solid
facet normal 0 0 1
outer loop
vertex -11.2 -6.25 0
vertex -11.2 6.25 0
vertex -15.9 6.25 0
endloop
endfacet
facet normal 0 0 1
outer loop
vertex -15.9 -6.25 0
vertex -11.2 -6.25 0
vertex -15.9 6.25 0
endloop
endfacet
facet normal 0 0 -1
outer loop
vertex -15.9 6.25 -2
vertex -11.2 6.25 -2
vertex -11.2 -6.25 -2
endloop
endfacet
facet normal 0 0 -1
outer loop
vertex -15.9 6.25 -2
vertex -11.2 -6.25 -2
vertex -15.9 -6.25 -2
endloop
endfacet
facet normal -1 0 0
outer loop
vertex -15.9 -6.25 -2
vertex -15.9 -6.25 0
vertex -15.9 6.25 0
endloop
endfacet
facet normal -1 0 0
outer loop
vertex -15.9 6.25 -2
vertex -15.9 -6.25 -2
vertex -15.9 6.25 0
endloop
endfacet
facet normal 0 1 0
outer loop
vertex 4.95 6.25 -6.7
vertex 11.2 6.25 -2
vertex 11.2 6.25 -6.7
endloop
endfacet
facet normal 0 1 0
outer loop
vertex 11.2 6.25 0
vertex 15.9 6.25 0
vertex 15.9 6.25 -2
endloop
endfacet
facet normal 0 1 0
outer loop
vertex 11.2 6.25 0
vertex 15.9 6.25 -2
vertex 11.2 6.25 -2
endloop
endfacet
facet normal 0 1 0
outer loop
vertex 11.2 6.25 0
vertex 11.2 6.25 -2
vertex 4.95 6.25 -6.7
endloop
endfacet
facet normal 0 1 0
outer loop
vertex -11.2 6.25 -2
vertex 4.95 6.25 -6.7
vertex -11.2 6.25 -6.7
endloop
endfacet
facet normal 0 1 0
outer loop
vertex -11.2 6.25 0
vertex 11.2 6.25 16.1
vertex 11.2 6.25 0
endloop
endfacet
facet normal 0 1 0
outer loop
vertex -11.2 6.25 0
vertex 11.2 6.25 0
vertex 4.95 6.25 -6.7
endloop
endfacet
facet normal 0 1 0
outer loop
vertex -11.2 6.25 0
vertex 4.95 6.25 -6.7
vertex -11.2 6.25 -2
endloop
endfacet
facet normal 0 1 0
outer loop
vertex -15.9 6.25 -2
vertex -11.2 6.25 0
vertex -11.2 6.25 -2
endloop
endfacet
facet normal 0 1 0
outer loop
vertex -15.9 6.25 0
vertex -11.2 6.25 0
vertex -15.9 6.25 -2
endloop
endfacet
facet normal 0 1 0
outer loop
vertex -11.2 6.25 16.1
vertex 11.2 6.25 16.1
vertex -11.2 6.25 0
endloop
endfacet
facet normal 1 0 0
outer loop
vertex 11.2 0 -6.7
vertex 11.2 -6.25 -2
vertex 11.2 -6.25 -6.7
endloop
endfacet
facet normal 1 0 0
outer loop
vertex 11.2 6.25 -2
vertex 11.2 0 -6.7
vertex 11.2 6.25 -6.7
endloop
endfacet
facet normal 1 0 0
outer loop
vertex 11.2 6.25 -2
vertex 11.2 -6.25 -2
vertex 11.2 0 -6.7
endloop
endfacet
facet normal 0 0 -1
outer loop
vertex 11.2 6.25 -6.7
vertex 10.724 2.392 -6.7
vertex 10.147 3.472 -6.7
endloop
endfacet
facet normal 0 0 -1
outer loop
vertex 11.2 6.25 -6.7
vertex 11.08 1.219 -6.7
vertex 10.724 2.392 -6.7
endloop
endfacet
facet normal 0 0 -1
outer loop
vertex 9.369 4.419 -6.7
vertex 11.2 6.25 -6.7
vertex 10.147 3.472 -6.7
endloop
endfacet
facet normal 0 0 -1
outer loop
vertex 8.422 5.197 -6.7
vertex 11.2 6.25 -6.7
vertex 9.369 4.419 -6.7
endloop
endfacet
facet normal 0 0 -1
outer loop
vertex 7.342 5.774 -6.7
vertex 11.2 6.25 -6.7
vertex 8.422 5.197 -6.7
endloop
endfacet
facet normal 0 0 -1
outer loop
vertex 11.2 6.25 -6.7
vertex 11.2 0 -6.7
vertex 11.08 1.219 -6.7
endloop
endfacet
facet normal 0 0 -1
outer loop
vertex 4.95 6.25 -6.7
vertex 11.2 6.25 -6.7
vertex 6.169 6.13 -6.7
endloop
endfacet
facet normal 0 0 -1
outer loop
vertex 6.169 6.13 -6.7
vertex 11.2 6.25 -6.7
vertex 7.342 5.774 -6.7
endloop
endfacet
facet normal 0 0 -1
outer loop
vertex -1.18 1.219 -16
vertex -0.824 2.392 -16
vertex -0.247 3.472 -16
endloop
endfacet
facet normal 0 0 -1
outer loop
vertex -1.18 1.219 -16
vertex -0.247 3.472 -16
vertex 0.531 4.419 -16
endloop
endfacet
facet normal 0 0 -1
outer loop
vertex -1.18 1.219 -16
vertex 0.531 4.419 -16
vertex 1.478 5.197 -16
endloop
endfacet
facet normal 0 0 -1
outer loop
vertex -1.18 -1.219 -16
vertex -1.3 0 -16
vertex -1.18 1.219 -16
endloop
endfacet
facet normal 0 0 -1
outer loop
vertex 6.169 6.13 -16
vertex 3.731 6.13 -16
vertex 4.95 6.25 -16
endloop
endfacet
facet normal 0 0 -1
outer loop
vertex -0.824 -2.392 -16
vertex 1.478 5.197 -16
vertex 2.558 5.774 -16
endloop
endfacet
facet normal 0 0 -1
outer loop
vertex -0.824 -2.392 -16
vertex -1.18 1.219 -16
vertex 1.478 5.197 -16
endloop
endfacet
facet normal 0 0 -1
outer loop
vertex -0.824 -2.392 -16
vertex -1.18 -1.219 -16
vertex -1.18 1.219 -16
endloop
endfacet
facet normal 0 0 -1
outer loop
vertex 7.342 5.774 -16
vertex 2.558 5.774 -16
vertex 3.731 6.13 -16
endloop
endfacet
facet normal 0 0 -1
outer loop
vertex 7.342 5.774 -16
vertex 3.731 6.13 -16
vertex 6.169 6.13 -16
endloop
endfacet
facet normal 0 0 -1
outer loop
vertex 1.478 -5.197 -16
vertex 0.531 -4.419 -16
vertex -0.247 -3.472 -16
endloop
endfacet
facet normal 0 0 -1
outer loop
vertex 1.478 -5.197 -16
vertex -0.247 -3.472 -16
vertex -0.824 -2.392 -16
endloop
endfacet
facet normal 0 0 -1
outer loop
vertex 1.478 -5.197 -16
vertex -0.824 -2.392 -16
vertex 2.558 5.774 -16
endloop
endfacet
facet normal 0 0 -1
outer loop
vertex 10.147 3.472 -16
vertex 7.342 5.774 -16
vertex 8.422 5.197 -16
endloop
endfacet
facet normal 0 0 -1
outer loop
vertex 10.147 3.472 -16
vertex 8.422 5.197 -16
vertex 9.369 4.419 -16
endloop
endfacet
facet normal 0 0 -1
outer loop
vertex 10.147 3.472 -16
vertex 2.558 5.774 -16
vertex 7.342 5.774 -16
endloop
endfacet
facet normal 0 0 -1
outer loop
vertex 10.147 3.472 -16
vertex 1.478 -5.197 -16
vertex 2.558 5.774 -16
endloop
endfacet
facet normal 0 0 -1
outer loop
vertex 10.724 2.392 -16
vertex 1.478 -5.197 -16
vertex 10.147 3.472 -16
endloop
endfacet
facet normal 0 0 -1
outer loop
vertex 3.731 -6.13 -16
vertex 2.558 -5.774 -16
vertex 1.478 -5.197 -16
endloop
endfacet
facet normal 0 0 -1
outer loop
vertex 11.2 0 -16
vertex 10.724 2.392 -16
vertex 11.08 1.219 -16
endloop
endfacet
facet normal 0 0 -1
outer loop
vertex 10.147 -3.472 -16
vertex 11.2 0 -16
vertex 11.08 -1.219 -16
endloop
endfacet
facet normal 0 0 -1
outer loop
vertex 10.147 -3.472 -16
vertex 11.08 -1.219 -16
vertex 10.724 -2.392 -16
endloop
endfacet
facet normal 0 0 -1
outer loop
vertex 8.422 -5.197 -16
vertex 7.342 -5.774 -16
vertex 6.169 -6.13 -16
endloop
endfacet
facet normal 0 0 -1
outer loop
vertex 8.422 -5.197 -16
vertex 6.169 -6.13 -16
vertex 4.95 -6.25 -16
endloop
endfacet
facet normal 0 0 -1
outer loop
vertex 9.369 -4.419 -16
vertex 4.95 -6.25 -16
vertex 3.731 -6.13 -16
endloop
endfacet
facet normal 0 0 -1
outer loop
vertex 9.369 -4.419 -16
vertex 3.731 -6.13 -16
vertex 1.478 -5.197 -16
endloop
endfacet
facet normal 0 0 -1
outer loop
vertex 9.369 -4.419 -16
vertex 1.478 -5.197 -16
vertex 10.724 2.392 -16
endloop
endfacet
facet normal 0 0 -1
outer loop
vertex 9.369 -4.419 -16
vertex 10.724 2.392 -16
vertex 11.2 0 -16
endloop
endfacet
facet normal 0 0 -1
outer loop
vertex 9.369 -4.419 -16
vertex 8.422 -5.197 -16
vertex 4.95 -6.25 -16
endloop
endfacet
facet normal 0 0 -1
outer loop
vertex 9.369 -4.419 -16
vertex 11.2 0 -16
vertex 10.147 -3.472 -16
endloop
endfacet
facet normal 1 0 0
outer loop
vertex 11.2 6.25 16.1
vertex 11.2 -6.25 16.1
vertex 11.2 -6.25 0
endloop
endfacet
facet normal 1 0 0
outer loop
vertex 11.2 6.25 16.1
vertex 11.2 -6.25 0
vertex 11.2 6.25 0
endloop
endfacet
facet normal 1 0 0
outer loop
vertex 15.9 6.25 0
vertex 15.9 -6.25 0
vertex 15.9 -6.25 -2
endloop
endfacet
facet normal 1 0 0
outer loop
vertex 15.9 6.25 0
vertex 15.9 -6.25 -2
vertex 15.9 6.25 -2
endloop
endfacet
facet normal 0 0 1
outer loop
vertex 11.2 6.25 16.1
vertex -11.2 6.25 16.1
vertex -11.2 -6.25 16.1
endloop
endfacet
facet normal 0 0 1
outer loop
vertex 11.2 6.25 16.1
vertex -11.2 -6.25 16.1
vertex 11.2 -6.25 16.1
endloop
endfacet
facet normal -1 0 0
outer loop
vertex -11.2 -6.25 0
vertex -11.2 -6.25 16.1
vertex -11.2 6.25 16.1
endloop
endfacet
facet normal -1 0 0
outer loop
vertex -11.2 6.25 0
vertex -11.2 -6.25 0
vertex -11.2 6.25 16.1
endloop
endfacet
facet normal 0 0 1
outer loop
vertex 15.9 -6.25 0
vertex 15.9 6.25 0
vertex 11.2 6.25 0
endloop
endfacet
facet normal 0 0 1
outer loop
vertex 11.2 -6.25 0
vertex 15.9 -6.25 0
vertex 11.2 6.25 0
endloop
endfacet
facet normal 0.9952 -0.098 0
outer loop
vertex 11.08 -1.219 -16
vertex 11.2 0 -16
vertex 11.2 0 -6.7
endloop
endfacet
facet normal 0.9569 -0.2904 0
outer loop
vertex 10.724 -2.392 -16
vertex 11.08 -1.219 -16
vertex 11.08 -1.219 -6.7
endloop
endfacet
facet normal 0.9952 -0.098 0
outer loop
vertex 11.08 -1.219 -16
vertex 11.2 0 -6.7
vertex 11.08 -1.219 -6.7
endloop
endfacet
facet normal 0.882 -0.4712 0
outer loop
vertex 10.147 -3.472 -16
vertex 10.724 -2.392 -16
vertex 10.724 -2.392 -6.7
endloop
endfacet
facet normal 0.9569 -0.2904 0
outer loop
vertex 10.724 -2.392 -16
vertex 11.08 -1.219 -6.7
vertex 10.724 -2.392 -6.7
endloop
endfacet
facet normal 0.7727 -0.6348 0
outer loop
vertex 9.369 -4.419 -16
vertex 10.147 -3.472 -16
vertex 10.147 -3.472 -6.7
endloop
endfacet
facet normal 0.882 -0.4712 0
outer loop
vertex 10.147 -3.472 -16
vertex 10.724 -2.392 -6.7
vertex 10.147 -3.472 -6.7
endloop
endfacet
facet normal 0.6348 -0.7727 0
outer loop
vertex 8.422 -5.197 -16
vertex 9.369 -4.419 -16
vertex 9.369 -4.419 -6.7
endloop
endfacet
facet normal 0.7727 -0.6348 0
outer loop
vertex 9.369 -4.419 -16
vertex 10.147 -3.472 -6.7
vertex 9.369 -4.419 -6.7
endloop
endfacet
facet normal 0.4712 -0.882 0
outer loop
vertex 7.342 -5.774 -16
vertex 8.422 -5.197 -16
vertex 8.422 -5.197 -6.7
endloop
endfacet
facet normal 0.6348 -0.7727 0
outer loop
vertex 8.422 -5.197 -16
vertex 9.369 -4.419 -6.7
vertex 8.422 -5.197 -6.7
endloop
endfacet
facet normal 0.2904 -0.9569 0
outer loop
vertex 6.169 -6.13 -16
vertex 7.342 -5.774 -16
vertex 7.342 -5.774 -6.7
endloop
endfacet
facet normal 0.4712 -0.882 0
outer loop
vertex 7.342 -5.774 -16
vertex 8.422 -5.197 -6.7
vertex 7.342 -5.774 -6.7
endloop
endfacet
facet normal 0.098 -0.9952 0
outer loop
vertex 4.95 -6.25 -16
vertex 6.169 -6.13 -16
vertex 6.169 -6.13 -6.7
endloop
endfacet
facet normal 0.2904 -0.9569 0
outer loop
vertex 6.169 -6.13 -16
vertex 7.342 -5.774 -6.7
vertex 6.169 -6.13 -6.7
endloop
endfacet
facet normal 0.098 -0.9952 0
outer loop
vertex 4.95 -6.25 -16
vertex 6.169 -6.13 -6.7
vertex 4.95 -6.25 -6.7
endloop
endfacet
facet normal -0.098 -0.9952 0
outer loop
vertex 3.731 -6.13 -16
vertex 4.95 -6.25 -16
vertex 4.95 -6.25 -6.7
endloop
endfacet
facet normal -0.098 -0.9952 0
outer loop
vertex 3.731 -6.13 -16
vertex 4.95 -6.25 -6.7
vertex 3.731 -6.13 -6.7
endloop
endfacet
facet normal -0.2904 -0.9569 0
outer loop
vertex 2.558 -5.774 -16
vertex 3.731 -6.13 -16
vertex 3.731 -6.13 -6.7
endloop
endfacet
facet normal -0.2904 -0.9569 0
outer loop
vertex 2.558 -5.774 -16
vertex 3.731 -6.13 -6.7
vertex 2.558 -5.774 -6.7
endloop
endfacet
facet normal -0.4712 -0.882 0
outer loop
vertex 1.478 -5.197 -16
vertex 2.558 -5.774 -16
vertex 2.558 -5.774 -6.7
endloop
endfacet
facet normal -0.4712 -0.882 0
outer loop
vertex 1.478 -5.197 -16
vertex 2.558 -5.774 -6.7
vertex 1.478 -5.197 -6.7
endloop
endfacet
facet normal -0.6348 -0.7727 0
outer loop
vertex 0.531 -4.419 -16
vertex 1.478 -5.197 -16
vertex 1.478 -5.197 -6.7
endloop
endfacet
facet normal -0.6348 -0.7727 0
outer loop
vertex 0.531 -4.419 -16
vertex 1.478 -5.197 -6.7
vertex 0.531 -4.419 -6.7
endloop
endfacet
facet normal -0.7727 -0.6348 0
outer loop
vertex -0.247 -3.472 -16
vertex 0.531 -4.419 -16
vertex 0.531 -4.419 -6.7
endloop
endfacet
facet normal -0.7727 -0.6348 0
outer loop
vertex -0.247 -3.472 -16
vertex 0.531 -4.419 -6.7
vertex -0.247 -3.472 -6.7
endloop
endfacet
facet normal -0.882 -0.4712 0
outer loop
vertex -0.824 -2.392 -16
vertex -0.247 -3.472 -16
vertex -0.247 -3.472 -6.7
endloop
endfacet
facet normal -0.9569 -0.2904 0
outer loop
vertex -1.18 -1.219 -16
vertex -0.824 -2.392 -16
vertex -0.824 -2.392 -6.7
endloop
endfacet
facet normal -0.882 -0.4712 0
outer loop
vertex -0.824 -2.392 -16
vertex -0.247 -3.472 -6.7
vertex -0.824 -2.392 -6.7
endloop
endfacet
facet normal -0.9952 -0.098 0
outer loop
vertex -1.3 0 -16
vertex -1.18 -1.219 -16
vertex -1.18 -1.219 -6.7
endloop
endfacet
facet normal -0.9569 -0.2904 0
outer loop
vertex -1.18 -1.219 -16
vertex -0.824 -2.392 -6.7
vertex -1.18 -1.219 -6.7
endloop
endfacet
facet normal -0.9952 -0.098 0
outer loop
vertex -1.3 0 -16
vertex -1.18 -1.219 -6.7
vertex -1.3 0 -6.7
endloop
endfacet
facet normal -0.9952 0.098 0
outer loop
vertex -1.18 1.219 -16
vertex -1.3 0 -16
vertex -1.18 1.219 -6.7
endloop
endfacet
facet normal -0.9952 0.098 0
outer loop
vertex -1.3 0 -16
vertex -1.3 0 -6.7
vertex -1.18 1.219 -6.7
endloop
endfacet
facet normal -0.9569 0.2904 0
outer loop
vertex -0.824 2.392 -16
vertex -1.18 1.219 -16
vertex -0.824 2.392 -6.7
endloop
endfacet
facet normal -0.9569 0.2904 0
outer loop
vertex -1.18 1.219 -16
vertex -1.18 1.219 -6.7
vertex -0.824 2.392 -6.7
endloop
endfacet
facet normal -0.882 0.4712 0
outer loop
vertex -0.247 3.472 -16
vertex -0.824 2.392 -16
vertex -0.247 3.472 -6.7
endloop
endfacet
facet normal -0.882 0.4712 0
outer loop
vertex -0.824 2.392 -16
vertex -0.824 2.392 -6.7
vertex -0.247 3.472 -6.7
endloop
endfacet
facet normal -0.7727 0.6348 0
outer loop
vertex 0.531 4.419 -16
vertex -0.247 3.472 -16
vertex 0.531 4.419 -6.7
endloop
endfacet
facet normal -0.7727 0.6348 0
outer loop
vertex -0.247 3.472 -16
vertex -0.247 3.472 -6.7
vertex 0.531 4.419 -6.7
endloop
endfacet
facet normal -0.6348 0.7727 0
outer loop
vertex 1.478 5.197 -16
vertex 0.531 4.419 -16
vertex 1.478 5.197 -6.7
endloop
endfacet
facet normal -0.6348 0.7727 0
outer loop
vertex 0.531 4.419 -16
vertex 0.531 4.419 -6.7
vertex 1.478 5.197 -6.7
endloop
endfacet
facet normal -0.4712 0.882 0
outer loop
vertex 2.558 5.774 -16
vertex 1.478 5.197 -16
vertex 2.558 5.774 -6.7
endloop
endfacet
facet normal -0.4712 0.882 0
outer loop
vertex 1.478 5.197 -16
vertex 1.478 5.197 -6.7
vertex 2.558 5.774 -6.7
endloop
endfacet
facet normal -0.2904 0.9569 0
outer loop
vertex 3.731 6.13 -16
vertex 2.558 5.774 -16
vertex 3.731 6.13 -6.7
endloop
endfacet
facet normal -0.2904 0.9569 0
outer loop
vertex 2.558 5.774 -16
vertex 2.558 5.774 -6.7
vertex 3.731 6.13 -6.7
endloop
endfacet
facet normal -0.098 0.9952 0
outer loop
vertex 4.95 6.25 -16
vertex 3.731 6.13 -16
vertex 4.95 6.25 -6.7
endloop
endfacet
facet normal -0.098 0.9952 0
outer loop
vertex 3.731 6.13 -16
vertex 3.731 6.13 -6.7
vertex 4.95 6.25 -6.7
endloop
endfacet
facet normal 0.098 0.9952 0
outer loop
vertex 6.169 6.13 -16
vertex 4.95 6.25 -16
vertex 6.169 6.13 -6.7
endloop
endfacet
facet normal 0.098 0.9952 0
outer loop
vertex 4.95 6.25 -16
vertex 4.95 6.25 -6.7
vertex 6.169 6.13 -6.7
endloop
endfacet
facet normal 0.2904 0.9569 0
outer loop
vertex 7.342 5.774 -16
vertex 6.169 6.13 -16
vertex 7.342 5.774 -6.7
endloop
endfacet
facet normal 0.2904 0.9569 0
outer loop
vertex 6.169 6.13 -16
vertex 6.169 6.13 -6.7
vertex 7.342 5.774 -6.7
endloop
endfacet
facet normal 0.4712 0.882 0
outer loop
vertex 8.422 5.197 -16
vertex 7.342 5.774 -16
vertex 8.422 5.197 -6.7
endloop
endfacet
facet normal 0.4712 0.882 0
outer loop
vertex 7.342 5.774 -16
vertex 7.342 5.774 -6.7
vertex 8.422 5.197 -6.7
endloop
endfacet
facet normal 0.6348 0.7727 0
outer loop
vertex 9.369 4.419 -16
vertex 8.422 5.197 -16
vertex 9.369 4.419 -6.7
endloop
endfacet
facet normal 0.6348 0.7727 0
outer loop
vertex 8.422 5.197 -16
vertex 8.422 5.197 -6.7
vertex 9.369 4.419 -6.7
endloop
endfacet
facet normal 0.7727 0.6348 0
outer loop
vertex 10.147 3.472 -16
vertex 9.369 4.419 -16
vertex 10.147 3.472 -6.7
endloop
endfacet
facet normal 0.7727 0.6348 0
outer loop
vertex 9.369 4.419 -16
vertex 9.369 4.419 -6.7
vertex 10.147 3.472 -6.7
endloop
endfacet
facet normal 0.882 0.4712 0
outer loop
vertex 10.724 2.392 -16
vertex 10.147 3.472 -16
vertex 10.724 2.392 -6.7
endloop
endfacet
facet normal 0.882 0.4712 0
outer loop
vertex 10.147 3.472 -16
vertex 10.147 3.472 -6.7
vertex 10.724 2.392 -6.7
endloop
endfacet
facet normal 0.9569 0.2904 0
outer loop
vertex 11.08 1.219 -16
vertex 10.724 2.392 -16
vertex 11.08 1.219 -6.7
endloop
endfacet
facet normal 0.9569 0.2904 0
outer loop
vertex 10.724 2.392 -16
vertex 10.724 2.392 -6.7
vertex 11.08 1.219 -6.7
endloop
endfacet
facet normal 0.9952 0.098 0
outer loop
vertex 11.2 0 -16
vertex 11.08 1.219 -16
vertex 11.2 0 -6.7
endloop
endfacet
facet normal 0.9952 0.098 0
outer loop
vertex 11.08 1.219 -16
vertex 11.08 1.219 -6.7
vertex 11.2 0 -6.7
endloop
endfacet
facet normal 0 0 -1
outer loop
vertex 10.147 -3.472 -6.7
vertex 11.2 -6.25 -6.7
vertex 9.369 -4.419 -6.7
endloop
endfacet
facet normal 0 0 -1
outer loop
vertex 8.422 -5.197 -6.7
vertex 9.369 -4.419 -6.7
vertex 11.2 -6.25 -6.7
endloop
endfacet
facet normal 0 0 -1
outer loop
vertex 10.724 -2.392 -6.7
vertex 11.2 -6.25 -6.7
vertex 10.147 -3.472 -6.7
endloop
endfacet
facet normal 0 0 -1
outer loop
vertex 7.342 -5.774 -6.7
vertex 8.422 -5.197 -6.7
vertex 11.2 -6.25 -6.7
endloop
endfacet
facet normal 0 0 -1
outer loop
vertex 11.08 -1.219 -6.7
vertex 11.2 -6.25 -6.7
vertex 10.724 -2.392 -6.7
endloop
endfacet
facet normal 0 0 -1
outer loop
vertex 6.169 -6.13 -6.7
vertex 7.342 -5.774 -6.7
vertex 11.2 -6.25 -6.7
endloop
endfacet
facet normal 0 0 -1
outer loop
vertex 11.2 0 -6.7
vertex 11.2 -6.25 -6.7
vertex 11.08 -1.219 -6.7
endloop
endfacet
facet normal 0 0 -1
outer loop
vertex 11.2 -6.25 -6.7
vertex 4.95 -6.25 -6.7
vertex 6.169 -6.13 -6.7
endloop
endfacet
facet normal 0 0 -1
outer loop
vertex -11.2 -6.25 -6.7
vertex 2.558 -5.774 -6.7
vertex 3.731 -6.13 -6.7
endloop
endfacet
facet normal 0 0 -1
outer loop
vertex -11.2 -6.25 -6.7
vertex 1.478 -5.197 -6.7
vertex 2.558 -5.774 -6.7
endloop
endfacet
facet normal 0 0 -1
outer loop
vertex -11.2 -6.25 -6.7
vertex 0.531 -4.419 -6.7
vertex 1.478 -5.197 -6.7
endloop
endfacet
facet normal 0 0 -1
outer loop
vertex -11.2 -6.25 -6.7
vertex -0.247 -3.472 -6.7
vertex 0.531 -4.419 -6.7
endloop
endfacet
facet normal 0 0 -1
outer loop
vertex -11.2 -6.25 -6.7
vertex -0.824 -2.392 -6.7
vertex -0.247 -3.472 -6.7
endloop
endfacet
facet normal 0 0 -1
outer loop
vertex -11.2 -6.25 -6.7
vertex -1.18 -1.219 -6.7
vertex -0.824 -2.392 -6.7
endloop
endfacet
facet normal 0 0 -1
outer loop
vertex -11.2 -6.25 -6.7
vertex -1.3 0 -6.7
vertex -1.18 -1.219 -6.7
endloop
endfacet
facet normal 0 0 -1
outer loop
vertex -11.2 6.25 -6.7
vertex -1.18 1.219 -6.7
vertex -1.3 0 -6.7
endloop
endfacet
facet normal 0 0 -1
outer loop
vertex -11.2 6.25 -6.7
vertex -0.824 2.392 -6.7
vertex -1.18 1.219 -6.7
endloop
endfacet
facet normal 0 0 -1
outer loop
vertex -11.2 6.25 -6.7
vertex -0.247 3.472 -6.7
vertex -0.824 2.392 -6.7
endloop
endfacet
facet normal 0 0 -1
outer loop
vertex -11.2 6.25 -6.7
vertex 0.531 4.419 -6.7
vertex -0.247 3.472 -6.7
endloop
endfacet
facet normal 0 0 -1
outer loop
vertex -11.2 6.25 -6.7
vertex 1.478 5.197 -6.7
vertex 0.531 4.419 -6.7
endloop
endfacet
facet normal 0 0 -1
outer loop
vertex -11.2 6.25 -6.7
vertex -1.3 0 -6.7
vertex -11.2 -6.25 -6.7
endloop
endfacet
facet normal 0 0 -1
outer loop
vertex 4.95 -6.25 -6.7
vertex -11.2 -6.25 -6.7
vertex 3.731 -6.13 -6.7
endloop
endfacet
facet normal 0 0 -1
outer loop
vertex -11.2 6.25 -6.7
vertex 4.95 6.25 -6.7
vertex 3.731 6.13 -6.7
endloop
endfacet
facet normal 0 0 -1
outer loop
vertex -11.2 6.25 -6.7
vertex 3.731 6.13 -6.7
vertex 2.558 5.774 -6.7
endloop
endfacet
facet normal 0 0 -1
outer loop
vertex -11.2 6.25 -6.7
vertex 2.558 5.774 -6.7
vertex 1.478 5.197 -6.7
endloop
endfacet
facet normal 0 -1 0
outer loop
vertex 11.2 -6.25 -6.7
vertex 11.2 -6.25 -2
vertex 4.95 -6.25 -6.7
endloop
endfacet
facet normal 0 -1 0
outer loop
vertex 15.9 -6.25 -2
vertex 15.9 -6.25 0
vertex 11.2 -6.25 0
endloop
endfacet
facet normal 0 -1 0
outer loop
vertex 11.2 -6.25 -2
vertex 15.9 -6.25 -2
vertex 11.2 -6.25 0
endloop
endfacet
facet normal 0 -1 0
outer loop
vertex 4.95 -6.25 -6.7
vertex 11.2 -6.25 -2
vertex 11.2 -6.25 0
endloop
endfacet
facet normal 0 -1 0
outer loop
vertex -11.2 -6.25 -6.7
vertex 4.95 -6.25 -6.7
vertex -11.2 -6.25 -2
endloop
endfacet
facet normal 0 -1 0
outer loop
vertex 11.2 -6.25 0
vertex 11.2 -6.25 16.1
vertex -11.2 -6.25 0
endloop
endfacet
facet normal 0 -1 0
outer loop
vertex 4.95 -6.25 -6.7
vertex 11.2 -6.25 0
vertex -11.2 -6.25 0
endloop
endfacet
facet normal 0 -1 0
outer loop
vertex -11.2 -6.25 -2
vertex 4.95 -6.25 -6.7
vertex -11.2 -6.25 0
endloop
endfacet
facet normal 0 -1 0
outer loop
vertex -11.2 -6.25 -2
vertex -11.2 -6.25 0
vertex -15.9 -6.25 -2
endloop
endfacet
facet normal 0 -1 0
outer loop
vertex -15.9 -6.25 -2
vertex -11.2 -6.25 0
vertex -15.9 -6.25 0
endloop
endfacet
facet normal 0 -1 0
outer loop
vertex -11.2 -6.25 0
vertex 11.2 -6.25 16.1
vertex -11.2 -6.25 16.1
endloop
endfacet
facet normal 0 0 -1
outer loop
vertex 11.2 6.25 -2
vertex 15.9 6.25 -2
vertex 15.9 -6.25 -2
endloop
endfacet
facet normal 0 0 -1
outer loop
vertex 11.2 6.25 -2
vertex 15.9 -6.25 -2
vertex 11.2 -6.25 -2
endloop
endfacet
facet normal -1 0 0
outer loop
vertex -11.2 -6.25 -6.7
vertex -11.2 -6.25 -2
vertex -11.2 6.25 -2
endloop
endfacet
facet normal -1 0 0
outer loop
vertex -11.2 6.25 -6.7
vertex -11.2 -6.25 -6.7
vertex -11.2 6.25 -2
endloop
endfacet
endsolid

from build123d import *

# Parameters (mm, degrees)
SKETCH_1_W      = 22.4
SKETCH_1_H      = 12.5
EXTRUDE_1_DEPTH = 16.1
SKETCH_2_W      = 31.8
SKETCH_2_H      = 12.5
EXTRUDE_2_DEPTH = 2
SKETCH_3_W      = 22.4
SKETCH_3_H      = 12.5
EXTRUDE_3_DEPTH = 4.7
SKETCH_4_R      = 6.25
EXTRUDE_4_DEPTH = 9.3


with BuildPart() as part:
    # 草图1 → 凸台-拉伸1 (new body)
    with BuildSketch(Plane.XY):
        Rectangle(SKETCH_1_W, SKETCH_1_H)
    extrude(amount=EXTRUDE_1_DEPTH)

    # 草图2 → 凸台-拉伸2 (add)
    with BuildSketch(Plane(origin=(0, 0, 0), x_dir=(-1, 0, 0), z_dir=(0, 0, -1))):
        Rectangle(SKETCH_2_W, SKETCH_2_H)
    extrude(amount=EXTRUDE_2_DEPTH)

    # 草图3 → 凸台-拉伸3 (add)
    with BuildSketch(Plane(origin=(0, 0, -2), x_dir=(-1, 0, 0), z_dir=(0, 0, -1))):
        Rectangle(SKETCH_3_W, SKETCH_3_H)
    extrude(amount=EXTRUDE_3_DEPTH)

    # 草图4 → 凸台-拉伸4 (add)
    with BuildSketch(Plane(origin=(0, 0, -6.7), x_dir=(-1, 0, 0), z_dir=(0, 0, -1))):
        with Locations(Location((-4.95, 0, 0), (0, 0, 180))):
            Circle(SKETCH_4_R)
    extrude(amount=EXTRUDE_4_DEPTH)


solid = part.part
